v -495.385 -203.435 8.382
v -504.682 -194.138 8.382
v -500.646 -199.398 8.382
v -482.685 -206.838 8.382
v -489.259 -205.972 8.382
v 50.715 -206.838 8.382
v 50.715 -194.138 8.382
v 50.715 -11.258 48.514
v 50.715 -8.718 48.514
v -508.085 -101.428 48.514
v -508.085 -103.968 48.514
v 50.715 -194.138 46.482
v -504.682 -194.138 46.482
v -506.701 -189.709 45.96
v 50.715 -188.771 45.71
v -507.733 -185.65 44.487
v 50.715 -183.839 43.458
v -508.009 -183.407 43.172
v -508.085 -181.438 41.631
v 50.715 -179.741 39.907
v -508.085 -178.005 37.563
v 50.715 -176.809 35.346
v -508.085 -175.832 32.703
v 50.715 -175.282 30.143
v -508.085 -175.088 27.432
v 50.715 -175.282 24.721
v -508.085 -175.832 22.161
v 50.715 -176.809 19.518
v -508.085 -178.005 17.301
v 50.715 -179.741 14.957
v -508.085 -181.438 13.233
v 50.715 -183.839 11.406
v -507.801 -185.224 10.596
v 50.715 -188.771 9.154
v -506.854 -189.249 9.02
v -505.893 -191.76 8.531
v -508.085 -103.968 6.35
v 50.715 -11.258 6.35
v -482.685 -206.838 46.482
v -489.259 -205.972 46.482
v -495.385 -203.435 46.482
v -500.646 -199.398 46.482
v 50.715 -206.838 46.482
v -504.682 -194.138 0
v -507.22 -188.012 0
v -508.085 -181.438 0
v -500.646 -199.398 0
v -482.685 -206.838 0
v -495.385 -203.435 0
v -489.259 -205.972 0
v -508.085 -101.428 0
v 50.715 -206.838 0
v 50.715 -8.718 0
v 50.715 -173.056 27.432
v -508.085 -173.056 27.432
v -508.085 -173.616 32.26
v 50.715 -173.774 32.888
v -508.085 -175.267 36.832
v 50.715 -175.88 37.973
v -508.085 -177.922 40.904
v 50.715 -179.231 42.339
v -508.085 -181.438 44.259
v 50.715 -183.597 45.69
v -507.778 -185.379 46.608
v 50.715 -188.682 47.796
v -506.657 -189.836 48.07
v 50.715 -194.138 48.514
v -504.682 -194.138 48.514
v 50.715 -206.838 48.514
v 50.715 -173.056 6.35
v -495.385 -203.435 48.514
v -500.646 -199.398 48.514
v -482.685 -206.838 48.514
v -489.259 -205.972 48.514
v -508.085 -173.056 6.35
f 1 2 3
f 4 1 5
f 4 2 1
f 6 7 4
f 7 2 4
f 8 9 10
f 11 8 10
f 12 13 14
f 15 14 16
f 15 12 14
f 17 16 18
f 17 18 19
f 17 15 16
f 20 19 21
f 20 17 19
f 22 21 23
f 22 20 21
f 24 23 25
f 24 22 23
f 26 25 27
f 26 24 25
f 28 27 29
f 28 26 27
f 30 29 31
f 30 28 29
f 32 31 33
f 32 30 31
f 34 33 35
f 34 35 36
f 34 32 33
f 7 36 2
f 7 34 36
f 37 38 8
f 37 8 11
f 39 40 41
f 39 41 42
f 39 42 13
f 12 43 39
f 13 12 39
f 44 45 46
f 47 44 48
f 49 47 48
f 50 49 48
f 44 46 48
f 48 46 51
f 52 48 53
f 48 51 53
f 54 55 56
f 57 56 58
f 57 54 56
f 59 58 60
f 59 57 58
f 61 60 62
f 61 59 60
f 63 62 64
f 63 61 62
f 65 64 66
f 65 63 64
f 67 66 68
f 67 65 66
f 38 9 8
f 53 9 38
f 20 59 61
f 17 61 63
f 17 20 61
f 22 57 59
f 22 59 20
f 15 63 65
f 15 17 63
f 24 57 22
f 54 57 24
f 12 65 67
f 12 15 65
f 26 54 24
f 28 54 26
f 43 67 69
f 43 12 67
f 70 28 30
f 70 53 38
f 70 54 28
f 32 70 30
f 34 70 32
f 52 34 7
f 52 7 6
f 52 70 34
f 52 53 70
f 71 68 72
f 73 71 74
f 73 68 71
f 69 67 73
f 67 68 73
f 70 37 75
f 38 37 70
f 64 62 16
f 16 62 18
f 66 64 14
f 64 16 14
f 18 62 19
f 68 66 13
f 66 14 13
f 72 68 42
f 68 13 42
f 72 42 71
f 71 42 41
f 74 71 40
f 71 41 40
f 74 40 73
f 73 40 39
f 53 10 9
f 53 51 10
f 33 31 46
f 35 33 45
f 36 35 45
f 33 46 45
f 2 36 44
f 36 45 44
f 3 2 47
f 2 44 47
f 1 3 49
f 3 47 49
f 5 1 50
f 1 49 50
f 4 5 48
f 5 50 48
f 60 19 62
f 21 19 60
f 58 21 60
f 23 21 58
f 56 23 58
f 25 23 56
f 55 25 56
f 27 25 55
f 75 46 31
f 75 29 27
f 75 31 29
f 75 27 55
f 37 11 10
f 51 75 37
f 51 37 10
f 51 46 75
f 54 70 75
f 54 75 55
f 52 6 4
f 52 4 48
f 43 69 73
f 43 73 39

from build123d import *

# Parameters (mm, degrees)
BOSS_EXTRUDE1_DEPTH     = 6.35
BOSS_EXTRUDE7_DEPTH     = 558.8
CUT_EXTRUDE1_DEPTH      = 551.191074589
CUT_EXTRUDE1_DEPTH_BACK = 551.191074589
BOSS_EXTRUDE8_DEPTH     = 42.164
CUT_EXTRUDE2_DEPTH      = 110.49


with BuildPart() as part:
    # Sketch1 → Boss-Extrude1 (new body)
    with BuildSketch(Plane.XY):
        with BuildLine():
            Line((-508.085110878, -34.117945662), (-508.085110878, -168.737945662))
            Line((-508.085110878, -168.737945662), (-508.085110878, -181.437945662))
            ThreePointArc((-508.085110878, -181.437945662), (-500.64562312, -199.398457904), (-482.685110878, -206.837945662))
            Line((-482.685110878, -206.837945662), (50.714889122, -206.837945662))
            Line((50.714889122, -206.837945662), (50.714889122, -8.717945662))
            Line((50.714889122, -8.717945662), (-482.685110878, -8.717945662))
            ThreePointArc((-482.685110878, -8.717945662), (-500.64562312, -16.15743342), (-508.085110878, -34.117945662))
        make_face()
    extrude(amount=BOSS_EXTRUDE1_DEPTH)

    # Sketch3 → Boss-Extrude7 (add)
    with BuildSketch(Plane(origin=(50.714889122, 0, 0), x_dir=(0, 0, -1), z_dir=(1, 0, 0))):
        with BuildLine():
            Line((-6.35, -173.055945662), (-27.432, -173.055945662))
            ThreePointArc((-27.432, -173.055945662), (-42.339225161, -179.230720501), (-48.514, -194.137945662))
            Line((-48.514, -194.137945662), (-48.514, -206.837945662))
            Line((-48.514, -206.837945662), (-46.482, -206.837945662))
            Line((-46.482, -206.837945662), (-46.482, -194.137945662))
            ThreePointArc((-46.482, -194.137945662), (-27.432, -175.087945662), (-8.382, -194.137945662))
            Line((-8.382, -194.137945662), (-8.382, -206.837945662))
            Line((-8.382, -206.837945662), (-6.35, -206.837945662))
            Line((-6.35, -206.837945662), (-6.35, -173.055945662))
        make_face()
    extrude(amount=-BOSS_EXTRUDE7_DEPTH)

    # Sketch4 → Cut-Extrude1 (cut, two sides: drawn at the far end of the back side and taken through both)
    with BuildSketch(Plane.XY.offset(6.35).offset(-CUT_EXTRUDE1_DEPTH_BACK)):
        Polygon((-508.085110878, -101.427945662), (50.714889122, -8.717945662), (-523.466542696, -8.717945662), align=None)
    extrude(amount=CUT_EXTRUDE1_DEPTH + CUT_EXTRUDE1_DEPTH_BACK, mode=Mode.SUBTRACT)

    # Sketch5 → Boss-Extrude8 (add, through all)
    with BuildSketch(Plane.XY.offset(6.35)):
        Polygon((-508.085110878, -101.427945662), (50.714889122, -8.717945662), (50.714889122, -11.257945662), (-508.085110878, -103.967945662), align=None)
    extrude(amount=BOSS_EXTRUDE8_DEPTH)

    # Sketch6 → Cut-Extrude2 (cut)
    with BuildSketch(Plane(origin=(0, 0, 6.35), x_dir=(-1, 0, 0), z_dir=(0, 0, -1))):
        with BuildLine():
            Line((482.685110878, -206.837945662), (508.085110878, -206.837945662))
            Line((508.085110878, -206.837945662), (508.085110878, -181.437945662))
            ThreePointArc((508.085110878, -181.437945662), (500.64562312, -199.398457904), (482.685110878, -206.837945662))
        make_face()
    extrude(amount=-CUT_EXTRUDE2_DEPTH, mode=Mode.SUBTRACT)


solid = part.part
